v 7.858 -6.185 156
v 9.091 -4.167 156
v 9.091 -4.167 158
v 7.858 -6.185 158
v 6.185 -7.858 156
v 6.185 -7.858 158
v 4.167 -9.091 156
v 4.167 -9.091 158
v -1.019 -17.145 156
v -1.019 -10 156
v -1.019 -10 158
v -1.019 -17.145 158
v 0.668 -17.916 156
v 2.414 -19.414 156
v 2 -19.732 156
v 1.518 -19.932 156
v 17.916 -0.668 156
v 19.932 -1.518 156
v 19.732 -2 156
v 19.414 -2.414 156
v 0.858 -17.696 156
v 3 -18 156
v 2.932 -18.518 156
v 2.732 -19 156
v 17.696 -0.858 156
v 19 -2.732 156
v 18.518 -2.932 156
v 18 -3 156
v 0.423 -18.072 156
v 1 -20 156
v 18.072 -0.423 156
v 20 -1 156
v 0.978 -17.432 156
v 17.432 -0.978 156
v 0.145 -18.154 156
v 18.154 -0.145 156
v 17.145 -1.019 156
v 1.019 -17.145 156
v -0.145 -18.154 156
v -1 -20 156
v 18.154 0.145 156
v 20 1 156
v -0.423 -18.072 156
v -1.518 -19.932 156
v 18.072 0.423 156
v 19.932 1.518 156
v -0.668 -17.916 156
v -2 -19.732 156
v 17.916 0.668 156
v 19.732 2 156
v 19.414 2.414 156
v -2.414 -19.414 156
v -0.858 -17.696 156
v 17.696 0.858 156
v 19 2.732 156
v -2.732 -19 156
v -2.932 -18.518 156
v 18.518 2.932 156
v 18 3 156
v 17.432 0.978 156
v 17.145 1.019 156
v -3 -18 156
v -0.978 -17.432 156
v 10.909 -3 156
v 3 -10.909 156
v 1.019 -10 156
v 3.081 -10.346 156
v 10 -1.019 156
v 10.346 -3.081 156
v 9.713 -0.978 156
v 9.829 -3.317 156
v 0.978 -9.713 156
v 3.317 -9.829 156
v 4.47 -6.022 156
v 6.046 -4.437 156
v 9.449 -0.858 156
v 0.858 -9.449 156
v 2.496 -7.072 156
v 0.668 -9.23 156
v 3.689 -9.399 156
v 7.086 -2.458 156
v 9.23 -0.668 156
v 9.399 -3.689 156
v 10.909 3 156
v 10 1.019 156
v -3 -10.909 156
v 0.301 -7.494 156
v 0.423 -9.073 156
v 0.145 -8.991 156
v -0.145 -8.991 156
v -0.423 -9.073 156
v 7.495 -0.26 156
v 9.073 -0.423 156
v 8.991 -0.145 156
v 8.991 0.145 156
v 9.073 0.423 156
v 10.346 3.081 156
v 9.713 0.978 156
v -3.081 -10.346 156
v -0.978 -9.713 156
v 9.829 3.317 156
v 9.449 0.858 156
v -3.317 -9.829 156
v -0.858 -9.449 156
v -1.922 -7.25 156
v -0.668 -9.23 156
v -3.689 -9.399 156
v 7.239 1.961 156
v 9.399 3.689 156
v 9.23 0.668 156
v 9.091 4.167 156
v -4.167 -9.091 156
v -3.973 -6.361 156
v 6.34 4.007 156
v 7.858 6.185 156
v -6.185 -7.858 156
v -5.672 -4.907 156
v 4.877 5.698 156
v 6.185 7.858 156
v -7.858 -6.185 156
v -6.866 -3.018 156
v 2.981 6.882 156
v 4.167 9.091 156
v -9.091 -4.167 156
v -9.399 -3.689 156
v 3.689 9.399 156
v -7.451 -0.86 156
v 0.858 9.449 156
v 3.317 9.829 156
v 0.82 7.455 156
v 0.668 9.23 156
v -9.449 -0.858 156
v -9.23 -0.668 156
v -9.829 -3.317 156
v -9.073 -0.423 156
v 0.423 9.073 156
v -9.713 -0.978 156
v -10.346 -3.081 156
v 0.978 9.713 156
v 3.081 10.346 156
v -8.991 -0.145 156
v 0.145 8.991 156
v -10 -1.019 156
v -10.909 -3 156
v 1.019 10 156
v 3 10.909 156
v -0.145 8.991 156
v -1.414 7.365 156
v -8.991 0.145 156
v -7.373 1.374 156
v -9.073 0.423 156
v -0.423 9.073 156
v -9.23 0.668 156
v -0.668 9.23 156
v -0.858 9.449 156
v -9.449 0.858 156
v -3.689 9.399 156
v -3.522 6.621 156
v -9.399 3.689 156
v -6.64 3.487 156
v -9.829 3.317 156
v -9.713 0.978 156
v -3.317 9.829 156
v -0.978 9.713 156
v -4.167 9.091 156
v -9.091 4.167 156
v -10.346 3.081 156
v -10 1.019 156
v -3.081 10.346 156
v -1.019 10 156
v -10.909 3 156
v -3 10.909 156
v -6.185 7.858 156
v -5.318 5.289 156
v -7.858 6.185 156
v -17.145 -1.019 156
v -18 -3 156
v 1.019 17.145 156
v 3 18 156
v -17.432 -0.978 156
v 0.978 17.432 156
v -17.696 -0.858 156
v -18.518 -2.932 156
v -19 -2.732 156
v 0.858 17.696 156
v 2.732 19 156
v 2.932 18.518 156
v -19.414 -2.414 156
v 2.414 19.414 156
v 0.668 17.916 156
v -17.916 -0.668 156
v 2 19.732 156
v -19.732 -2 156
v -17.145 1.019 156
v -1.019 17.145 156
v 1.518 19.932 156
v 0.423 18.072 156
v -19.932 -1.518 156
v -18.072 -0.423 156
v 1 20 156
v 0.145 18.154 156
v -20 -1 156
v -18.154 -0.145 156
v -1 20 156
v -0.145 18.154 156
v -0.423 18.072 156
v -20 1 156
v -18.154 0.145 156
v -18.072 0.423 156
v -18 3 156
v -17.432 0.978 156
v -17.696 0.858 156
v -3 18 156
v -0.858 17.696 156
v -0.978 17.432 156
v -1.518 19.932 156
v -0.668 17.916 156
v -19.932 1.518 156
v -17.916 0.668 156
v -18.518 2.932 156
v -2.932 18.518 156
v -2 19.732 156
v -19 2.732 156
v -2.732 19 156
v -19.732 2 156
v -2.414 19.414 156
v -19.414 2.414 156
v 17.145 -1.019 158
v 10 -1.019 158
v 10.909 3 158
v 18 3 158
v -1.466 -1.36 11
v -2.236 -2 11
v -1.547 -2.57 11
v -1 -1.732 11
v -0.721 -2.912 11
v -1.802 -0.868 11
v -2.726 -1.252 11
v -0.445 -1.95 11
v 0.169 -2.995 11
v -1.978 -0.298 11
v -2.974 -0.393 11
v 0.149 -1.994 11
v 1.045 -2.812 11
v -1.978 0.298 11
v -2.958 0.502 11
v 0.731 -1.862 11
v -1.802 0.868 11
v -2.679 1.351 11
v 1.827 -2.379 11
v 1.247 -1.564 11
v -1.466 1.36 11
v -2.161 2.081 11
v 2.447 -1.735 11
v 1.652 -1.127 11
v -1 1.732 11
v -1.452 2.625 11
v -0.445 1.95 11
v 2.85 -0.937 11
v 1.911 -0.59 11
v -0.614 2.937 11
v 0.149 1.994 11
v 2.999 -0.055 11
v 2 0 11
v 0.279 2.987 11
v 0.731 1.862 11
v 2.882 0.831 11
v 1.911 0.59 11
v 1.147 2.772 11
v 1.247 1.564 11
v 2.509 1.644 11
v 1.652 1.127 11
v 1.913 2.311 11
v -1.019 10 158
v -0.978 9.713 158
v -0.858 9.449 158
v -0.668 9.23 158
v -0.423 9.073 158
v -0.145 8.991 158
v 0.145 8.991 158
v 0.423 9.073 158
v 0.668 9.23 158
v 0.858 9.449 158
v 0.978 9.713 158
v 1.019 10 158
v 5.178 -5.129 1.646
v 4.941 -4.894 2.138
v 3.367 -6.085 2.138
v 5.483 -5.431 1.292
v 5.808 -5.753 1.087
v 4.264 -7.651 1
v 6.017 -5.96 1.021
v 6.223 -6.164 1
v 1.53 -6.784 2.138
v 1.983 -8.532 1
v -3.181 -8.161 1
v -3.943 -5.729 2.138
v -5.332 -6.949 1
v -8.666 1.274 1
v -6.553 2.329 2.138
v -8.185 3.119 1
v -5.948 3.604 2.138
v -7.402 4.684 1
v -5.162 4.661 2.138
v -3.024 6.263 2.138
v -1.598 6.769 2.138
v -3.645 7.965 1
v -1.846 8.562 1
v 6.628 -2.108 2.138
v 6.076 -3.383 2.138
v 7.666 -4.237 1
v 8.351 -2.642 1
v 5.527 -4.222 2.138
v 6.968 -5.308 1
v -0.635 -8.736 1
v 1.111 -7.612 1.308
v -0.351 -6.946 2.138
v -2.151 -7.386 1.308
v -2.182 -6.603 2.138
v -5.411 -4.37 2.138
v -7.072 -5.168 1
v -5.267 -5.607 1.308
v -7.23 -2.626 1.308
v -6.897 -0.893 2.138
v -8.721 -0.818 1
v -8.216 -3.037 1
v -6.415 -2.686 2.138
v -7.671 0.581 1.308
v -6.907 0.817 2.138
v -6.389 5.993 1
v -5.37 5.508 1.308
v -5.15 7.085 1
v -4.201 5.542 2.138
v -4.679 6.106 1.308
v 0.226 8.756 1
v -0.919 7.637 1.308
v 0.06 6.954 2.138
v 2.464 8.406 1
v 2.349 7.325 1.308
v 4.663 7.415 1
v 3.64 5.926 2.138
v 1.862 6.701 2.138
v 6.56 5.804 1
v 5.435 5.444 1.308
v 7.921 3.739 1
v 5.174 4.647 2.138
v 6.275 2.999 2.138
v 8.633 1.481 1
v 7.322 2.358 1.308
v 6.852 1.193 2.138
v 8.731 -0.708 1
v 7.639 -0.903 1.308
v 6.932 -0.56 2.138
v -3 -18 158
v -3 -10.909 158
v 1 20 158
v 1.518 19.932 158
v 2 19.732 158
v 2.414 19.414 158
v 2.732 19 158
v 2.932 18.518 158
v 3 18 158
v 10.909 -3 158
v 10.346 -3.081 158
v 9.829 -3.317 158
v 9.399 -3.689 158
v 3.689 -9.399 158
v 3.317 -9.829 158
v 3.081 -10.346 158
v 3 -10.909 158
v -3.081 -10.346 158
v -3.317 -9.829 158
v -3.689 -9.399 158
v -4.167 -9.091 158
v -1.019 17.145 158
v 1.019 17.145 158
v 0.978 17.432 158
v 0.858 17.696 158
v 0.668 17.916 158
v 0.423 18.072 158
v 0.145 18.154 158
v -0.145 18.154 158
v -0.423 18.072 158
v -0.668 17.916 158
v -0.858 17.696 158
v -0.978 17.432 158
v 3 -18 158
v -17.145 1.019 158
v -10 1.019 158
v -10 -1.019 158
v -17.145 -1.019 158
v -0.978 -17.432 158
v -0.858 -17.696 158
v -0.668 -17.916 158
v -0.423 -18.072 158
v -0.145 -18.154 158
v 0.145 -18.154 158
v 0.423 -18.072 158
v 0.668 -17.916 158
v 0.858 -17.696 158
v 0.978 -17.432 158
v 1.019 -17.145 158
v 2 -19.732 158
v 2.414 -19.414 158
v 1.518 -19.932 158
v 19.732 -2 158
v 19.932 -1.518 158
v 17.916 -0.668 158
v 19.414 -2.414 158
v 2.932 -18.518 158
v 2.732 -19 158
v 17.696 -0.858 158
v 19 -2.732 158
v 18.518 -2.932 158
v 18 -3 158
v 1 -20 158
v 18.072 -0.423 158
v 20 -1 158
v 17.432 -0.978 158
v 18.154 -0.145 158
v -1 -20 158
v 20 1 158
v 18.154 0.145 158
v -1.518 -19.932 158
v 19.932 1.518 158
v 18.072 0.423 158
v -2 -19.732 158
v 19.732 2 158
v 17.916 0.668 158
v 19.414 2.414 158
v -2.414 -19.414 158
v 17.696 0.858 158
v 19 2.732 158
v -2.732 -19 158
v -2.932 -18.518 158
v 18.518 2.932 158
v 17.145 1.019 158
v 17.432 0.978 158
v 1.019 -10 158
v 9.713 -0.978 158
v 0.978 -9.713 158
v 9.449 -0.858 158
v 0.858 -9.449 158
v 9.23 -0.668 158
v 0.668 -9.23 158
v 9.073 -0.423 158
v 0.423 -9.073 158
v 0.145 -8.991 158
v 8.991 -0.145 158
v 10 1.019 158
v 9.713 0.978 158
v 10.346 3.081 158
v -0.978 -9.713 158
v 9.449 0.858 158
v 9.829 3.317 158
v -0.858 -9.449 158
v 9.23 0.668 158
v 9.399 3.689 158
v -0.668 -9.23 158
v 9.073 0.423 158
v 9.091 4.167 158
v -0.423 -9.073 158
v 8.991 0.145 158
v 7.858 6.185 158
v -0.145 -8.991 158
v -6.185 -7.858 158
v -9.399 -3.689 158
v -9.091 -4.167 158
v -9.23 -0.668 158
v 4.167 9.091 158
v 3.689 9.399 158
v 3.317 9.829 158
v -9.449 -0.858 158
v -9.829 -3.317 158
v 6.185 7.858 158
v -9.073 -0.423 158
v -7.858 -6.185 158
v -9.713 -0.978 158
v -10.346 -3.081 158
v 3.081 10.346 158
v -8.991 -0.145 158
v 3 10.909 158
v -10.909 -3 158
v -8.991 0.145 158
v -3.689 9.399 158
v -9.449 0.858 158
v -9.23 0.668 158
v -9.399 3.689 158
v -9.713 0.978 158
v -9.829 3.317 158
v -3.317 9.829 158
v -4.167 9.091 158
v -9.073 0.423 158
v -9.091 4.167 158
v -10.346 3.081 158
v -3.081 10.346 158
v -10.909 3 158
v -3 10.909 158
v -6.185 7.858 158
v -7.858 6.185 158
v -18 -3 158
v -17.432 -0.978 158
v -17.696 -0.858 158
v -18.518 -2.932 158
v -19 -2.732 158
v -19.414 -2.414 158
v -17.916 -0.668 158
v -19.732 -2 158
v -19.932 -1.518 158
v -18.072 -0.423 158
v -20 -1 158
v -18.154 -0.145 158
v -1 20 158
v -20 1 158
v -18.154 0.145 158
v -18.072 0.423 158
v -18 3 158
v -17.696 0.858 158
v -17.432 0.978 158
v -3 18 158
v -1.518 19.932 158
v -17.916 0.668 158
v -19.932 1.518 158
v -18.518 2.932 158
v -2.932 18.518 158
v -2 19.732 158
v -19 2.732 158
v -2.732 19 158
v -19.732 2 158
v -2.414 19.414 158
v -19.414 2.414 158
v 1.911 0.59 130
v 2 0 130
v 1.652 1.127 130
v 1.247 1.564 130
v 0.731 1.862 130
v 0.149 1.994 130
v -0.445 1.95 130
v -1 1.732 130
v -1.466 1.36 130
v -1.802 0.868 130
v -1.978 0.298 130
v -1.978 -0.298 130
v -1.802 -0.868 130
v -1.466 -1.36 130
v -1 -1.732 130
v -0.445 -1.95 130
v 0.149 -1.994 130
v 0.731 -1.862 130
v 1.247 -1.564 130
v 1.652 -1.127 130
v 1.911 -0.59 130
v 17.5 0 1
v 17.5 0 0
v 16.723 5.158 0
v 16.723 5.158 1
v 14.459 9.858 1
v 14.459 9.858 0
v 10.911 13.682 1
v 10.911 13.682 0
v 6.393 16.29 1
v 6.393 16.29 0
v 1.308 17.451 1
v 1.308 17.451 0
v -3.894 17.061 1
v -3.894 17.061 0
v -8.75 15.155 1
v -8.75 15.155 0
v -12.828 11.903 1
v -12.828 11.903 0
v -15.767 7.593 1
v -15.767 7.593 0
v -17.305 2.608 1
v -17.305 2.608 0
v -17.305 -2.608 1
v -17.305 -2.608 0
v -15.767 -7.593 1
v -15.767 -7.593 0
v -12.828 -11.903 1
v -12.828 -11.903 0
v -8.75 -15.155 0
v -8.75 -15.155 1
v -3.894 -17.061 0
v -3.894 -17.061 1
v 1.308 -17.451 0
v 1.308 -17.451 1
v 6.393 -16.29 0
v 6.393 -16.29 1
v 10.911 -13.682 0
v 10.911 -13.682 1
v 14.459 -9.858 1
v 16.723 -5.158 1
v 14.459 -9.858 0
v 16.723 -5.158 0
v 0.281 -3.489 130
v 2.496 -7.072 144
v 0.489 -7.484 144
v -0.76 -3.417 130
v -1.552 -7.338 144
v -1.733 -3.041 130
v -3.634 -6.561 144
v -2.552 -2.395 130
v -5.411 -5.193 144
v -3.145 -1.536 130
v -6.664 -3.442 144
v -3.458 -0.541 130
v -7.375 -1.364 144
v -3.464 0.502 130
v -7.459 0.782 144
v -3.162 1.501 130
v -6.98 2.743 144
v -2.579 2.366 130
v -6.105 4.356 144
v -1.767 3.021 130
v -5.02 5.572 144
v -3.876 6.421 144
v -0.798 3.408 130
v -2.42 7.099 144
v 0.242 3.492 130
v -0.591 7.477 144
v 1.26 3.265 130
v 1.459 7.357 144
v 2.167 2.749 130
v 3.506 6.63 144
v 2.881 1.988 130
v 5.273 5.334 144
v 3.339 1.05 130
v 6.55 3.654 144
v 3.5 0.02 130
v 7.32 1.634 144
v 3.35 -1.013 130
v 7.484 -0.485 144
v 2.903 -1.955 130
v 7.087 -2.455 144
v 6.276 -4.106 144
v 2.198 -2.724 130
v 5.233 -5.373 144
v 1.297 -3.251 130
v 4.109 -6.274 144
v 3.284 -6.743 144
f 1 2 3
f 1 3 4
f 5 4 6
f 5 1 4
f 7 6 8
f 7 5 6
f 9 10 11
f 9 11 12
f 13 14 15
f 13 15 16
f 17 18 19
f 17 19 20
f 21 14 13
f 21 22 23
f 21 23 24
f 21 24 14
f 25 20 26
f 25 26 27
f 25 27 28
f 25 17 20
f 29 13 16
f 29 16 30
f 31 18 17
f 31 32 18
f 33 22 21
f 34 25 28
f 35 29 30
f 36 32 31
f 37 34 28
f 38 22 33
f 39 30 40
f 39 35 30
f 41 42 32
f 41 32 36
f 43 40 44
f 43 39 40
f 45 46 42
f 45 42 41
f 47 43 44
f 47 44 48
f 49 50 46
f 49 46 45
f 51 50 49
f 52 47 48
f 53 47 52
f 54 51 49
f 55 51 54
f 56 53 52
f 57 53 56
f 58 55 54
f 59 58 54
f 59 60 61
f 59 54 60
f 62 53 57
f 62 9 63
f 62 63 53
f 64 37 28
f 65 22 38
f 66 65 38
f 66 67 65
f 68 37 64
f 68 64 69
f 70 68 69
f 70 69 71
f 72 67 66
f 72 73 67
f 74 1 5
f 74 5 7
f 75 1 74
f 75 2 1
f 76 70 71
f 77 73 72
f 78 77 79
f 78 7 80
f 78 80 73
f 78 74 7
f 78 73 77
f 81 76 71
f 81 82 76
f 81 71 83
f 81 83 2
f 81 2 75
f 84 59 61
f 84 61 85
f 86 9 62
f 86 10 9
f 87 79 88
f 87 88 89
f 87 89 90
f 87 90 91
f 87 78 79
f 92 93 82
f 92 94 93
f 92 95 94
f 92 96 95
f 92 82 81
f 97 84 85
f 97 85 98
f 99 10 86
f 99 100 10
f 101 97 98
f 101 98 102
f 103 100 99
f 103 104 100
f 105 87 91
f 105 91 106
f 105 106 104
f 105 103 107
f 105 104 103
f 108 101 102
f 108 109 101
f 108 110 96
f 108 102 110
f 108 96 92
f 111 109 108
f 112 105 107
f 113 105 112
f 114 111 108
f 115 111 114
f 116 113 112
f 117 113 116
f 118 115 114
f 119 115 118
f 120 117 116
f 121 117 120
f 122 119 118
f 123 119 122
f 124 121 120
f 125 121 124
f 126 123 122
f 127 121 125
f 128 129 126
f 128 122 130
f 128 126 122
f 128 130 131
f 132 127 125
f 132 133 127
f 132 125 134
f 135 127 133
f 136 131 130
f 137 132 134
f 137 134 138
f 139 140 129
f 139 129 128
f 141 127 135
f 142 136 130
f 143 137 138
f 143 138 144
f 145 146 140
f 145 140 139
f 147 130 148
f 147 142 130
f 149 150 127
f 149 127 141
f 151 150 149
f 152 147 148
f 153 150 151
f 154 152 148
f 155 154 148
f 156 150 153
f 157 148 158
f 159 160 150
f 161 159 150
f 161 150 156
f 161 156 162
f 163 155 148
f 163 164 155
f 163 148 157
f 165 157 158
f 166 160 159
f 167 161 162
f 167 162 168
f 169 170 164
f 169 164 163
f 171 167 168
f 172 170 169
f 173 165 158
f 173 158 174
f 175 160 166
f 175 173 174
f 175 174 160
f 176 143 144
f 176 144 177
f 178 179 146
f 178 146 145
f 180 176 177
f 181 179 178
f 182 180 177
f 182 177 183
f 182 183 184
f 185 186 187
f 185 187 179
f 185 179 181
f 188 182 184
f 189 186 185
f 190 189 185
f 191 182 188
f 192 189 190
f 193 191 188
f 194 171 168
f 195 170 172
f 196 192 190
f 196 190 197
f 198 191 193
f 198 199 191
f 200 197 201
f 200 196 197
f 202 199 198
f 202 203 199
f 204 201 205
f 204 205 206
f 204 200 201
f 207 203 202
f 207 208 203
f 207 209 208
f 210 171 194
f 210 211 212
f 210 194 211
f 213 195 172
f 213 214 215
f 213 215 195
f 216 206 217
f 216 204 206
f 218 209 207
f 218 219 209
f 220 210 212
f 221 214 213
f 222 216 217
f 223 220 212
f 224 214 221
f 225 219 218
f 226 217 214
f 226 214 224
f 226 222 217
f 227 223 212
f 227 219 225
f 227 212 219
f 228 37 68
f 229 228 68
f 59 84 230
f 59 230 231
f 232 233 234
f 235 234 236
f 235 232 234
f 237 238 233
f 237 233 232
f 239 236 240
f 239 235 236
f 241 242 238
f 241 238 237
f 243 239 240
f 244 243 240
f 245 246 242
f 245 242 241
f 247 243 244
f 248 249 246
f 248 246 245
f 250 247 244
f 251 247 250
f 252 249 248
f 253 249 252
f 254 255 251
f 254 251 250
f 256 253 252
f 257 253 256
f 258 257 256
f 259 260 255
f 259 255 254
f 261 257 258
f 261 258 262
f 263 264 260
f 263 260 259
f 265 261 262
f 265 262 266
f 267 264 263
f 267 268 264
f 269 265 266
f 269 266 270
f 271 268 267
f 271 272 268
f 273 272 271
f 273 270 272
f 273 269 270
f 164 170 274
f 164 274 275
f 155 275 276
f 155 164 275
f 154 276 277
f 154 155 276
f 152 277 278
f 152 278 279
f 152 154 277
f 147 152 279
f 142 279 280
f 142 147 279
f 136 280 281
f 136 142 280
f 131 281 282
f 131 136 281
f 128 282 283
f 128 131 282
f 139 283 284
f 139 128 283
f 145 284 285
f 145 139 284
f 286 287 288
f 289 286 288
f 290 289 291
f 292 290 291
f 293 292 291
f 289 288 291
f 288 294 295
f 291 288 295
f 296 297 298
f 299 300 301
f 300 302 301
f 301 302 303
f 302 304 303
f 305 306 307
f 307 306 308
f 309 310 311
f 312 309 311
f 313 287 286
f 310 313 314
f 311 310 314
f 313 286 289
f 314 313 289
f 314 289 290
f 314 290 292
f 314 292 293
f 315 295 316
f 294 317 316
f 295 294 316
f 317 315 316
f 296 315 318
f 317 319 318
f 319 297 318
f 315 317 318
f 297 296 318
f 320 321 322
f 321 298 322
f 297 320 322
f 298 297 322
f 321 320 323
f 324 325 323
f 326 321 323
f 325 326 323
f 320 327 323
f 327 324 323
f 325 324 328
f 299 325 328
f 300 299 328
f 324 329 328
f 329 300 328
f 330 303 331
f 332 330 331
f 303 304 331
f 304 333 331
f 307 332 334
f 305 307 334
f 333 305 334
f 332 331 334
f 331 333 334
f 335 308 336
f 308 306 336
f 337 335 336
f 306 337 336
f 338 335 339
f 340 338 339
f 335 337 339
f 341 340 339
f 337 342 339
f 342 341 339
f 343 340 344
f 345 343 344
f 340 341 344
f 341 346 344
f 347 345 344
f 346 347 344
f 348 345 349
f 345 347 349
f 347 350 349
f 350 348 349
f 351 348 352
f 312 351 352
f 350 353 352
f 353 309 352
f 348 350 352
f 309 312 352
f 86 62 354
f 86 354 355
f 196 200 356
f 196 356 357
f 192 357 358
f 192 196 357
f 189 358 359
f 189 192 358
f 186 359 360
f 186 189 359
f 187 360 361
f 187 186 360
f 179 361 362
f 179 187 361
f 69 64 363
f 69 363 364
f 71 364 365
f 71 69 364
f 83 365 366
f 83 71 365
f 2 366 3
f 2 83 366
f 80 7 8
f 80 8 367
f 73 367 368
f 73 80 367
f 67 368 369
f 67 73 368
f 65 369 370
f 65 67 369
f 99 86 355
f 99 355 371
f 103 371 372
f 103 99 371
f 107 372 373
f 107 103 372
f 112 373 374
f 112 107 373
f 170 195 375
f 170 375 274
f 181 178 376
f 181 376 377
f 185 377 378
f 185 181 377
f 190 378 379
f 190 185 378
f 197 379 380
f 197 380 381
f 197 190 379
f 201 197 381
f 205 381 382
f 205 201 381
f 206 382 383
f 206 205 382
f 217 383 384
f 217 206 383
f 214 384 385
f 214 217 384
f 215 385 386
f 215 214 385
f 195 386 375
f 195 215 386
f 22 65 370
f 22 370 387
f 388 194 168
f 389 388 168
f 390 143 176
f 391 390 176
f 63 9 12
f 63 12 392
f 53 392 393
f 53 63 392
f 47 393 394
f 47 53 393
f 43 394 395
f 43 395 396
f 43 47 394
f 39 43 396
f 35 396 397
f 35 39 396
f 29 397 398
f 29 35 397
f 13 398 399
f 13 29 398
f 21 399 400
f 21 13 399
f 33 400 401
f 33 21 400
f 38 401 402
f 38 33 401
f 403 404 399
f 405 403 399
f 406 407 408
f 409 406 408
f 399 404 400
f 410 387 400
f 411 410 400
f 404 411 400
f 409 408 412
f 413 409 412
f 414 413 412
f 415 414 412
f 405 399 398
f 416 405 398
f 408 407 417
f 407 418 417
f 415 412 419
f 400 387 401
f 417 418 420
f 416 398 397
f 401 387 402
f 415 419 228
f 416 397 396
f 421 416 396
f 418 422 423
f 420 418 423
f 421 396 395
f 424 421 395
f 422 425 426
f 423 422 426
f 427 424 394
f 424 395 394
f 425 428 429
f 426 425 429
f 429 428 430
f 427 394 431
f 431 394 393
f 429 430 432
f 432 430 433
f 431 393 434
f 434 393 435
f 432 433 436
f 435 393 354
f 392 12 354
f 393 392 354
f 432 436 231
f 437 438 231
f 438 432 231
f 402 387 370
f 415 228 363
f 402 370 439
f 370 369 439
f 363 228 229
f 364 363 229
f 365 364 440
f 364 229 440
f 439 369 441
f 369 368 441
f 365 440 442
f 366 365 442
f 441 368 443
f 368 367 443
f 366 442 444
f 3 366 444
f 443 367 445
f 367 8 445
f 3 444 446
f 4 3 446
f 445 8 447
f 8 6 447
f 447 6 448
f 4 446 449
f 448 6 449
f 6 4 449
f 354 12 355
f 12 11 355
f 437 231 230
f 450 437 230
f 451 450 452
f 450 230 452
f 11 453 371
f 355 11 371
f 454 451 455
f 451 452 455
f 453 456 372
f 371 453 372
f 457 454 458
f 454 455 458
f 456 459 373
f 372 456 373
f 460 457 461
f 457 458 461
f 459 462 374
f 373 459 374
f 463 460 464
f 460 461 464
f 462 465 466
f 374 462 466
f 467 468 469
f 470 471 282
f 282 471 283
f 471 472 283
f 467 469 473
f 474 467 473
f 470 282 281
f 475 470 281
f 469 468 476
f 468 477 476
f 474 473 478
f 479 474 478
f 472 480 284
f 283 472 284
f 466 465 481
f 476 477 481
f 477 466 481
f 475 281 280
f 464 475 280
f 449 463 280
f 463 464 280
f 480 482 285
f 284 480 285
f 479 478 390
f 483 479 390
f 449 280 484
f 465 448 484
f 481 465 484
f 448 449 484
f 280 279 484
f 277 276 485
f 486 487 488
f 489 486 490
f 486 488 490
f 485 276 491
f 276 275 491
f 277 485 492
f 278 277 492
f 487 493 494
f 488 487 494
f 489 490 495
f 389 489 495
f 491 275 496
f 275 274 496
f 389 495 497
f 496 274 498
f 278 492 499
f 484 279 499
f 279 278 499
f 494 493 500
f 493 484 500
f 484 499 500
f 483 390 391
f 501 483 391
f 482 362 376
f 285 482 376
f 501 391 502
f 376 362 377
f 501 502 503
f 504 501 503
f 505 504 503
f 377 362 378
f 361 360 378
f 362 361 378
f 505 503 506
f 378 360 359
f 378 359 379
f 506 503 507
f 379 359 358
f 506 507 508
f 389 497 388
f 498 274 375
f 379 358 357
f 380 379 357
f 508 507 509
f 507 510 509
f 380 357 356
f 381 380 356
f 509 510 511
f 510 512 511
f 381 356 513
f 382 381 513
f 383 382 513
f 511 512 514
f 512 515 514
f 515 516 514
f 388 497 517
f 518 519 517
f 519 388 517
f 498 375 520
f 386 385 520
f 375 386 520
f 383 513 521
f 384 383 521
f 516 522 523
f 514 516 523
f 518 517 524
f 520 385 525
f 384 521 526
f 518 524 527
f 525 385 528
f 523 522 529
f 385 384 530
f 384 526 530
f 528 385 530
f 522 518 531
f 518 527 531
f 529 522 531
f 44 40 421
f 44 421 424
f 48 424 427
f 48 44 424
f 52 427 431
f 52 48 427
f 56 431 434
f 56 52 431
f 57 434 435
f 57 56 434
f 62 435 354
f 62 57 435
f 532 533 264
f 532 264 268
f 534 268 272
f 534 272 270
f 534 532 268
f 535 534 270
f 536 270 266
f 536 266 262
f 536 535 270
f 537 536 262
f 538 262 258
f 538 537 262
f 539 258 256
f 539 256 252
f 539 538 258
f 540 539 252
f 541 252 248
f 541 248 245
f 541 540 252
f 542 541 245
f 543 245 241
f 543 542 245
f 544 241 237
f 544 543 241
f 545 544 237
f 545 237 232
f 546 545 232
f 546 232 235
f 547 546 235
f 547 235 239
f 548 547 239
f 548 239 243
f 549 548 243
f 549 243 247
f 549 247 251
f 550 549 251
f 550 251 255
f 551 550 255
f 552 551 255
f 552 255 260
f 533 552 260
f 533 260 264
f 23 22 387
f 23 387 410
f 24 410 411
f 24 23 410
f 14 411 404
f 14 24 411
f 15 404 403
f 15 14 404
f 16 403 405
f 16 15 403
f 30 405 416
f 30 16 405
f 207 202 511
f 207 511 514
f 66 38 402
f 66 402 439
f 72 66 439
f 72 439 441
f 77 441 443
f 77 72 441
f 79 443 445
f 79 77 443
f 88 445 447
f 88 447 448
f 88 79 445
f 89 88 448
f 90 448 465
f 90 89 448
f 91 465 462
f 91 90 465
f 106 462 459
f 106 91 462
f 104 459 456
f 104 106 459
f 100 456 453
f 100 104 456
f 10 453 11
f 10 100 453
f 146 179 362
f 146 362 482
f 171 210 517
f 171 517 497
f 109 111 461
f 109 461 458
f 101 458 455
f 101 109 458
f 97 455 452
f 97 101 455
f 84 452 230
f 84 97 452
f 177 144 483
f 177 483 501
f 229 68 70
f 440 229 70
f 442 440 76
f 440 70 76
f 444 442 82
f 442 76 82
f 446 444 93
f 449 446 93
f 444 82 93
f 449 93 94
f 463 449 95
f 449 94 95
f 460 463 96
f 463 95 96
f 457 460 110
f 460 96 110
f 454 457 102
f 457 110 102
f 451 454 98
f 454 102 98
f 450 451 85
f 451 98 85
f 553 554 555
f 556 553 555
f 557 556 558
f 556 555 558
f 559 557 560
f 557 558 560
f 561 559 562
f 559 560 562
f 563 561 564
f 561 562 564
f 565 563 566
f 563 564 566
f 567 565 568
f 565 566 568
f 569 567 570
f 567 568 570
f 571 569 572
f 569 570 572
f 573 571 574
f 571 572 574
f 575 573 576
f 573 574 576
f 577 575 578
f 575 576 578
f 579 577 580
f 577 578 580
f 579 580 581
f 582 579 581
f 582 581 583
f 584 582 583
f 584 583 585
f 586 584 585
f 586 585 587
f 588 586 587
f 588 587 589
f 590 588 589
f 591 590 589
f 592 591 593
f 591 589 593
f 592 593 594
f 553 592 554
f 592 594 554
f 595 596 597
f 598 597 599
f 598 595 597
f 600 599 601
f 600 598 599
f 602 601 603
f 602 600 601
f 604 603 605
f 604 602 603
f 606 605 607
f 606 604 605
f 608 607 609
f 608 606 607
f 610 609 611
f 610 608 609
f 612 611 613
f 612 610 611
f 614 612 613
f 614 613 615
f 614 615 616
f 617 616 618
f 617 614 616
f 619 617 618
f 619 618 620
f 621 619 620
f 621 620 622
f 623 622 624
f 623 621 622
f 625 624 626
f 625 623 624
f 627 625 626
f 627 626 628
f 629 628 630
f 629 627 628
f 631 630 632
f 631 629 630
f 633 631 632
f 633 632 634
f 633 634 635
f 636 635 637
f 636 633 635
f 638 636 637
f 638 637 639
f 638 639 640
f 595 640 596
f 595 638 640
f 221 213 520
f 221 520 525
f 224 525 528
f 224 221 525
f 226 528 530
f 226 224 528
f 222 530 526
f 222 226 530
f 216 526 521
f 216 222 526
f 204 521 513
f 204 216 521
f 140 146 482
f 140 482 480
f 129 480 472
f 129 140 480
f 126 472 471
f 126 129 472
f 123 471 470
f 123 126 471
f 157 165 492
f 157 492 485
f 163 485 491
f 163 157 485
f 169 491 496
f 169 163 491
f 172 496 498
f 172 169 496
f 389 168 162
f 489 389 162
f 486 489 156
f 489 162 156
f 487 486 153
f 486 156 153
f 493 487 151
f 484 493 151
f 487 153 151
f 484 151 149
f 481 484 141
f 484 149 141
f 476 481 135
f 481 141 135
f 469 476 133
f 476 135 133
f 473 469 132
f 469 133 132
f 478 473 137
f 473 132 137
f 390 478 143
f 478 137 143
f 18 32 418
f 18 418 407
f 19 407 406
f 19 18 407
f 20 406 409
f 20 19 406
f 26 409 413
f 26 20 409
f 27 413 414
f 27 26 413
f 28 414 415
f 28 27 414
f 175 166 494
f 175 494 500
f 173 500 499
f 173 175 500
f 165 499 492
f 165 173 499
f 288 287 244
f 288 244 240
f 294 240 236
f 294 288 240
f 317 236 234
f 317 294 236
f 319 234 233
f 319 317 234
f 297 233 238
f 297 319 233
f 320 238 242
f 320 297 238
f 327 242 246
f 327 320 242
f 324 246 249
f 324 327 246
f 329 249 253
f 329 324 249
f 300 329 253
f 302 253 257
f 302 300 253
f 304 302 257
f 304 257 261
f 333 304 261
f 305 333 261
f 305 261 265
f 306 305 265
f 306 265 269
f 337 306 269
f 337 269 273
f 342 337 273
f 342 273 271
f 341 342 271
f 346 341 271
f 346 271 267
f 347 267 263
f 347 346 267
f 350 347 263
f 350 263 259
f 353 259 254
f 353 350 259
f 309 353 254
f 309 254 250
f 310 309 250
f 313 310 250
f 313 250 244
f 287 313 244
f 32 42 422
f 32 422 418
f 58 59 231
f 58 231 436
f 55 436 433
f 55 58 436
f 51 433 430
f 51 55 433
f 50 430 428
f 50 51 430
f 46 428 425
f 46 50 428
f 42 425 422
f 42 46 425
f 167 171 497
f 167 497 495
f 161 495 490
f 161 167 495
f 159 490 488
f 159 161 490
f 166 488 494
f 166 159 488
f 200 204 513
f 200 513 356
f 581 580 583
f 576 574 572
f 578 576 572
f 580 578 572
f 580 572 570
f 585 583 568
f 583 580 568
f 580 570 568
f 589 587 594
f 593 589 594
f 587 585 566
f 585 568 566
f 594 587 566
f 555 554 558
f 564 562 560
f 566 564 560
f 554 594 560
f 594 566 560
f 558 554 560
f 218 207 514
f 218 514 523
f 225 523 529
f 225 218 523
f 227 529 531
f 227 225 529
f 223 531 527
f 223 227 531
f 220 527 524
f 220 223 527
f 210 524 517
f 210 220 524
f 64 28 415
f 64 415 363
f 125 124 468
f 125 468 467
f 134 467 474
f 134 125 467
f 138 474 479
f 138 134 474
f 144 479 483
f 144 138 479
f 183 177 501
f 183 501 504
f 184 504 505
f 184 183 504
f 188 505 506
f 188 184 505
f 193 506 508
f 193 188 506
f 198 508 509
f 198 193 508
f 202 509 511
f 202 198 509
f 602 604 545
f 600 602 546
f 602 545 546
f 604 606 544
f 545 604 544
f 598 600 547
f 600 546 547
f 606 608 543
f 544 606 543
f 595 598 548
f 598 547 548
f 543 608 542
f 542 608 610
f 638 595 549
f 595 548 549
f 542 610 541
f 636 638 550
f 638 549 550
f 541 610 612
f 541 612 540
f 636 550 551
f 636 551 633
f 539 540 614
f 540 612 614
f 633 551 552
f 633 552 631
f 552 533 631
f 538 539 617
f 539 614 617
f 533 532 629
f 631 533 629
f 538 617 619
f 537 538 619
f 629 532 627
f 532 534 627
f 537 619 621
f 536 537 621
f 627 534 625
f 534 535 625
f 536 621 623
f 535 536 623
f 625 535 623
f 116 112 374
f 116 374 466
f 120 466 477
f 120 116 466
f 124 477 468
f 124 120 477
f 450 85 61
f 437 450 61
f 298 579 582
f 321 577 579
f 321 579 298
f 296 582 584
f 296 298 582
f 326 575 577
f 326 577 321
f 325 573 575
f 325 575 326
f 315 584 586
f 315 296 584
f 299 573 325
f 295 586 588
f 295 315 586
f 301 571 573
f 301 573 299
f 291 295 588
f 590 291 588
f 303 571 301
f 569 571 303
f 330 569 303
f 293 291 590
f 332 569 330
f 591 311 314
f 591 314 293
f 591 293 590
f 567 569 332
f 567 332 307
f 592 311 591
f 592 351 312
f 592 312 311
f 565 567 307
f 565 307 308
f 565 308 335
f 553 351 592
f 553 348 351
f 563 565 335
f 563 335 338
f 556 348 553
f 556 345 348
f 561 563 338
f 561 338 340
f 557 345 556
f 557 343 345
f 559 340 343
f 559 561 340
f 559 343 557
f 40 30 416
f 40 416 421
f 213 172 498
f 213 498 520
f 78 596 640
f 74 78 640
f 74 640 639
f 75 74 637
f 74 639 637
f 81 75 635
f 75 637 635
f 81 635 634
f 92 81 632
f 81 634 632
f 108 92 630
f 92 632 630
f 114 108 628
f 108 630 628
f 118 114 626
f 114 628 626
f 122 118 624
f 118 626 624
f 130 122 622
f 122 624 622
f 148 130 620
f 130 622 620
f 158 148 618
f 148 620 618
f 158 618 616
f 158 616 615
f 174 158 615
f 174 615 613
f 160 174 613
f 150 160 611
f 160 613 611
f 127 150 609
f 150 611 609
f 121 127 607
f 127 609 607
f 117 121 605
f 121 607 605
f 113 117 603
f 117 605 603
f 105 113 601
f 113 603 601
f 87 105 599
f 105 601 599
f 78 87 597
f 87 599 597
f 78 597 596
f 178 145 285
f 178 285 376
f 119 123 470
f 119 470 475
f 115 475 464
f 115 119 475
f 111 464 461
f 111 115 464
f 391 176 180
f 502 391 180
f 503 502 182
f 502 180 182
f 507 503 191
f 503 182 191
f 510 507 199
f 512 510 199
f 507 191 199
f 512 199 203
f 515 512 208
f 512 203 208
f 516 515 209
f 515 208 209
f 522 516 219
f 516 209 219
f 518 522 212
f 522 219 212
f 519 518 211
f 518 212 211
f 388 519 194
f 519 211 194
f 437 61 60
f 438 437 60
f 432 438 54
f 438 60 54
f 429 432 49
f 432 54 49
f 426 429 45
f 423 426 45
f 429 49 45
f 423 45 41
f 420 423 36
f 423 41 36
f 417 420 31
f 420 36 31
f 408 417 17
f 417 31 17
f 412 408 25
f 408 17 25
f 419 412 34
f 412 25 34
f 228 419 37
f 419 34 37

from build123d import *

# Parameters (mm, degrees)
SKETCH1_R           = 17.5
BOSS_EXTRUDE1_DEPTH = 1
SKETCH3_R           = 3
BOSS_EXTRUDE2_DEPTH = 10
FILLET1_R           = 2
SKETCH4_R           = 2
CUT_EXTRUDE1_DEPTH  = 7
BOSS_EXTRUDE3_START = 140
SKETCH5_R           = 2
BOSS_EXTRUDE3_DEPTH = 140
SKETCH6_R           = 3.5
BOSS_EXTRUDE4_DEPTH = 14
SKETCH8_R           = 7.5
BOSS_EXTRUDE5_DEPTH = 12
BOSS_EXTRUDE6_DEPTH = 2


with BuildPart() as part:
    # Sketch1 → Boss-Extrude1 (new body)
    with BuildSketch(Plane.XY):
        Circle(SKETCH1_R)
    extrude(amount=BOSS_EXTRUDE1_DEPTH)

    # Sketch3 → Boss-Extrude2 (add)
    with BuildSketch(Plane.XY.offset(1)):
        Circle(SKETCH3_R)
    extrude(amount=BOSS_EXTRUDE2_DEPTH)

    # Loft1: read off the stored shape, not the designer's step
    # Loft1: loft between two sections, ruled curve by curve
    loft1_from = [
        Edge.make_bspline([(1.044538227, -2.81228375, 11), (-4.580029274, -4.901360204, 11), (-6.669105728, 0.723207296, 11), (-1.044538227, 2.81228375, 11), (4.580029274, 4.901360204, 11), (6.669105728, -0.723207296, 11), (1.044538227, -2.81228375, 11)], [0, 0, 0, 0, 0.5, 0.5, 0.5, 1, 1, 1, 1], 3, [1, 0.333333333, 0.333333333, 1, 0.333333333, 0.333333333, 1]),
    ]
    loft1_to = [
        Edge.make_bspline([(5.441388928, -5.161519789, 1), (-4.88165065, -16.044297645, 1), (-15.764428506, -5.721258067, 1), (-5.441388928, 5.161519789, 1), (4.88165065, 16.044297645, 1), (15.764428506, 5.721258067, 1), (5.441388928, -5.161519789, 1)], [0, 0, 0, 0, 0.5, 0.5, 0.5, 1, 1, 1, 1], 3, [1, 0.333333333, 0.333333333, 1, 0.333333333, 0.333333333, 1]),
    ]
    loft1 = Solid(Shell([*[Face.make_surface_from_curves(loft1_from[k], loft1_to[k]) for k in range(1)], Face(Wire(loft1_from)), Face(Wire(loft1_to))]))
    add(loft1)

    # Fillet1
    fillet1_edges = [part.edges().sort_by_distance(p)[0] for p in [
        (-5.441388928, 5.161519789, 1),
    ]]
    fillet(fillet1_edges, radius=FILLET1_R)

    # Sketch4 → Cut-Extrude1 (cut)
    with BuildSketch(Plane.XY.offset(11)):
        Circle(SKETCH4_R)
    extrude(amount=-CUT_EXTRUDE1_DEPTH, mode=Mode.SUBTRACT)

    # Sketch5 → Boss-Extrude3 (add)
    with BuildSketch(Plane.XY.offset(4).offset(BOSS_EXTRUDE3_START)):
        Circle(SKETCH5_R)
    extrude(amount=-BOSS_EXTRUDE3_DEPTH)

    # Sketch6 → Boss-Extrude4 (add)
    with BuildSketch(Plane.XY.offset(144)):
        Circle(SKETCH6_R)
    extrude(amount=-BOSS_EXTRUDE4_DEPTH)

    # Loft2: read off the stored shape, not the designer's step
    # Loft2: loft between two sections, ruled curve by curve
    loft2_from = [
        Edge.make_bspline([(2.496146584, -7.072429019, 144), (-11.648711454, -12.064722187, 144), (-16.641004622, 2.080135851, 144), (-2.496146584, 7.072429019, 144), (11.648711454, 12.064722187, 144), (16.641004622, -2.080135851, 144), (2.496146584, -7.072429019, 144)], [0, 0, 0, 0, 0.5, 0.5, 0.5, 1, 1, 1, 1], 3, [1, 0.333333333, 0.333333333, 1, 0.333333333, 0.333333333, 1]),
    ]
    loft2_to = [
        Edge.make_bspline([(0.28118335, -3.488686848, 130), (-6.696190346, -4.051053549, 130), (-7.258557046, 2.926320147, 130), (-0.28118335, 3.488686848, 130), (6.696190346, 4.051053549, 130), (7.258557046, -2.926320147, 130), (0.28118335, -3.488686848, 130)], [0, 0, 0, 0, 0.5, 0.5, 0.5, 1, 1, 1, 1], 3, [1, 0.333333333, 0.333333333, 1, 0.333333333, 0.333333333, 1]),
    ]
    loft2 = Solid(Shell([*[Face.make_surface_from_curves(loft2_from[k], loft2_to[k]) for k in range(1)], Face(Wire(loft2_from)), Face(Wire(loft2_to))]))
    add(loft2)

    # Sketch8 → Boss-Extrude5 (add)
    with BuildSketch(Plane.XY.offset(144)):
        with Locations(Location((0, 0, 0), (0, 0, 289.44))):
            Circle(SKETCH8_R)
    extrude(amount=BOSS_EXTRUDE5_DEPTH)

    # Sketch9 → Boss-Extrude6 (add)
    with BuildSketch(Plane.XY.offset(156)):
        with BuildLine():
            Line((-18, 3), (-10.908712115, 3))
            ThreePointArc((-10.908712115, 3), (-9.828588665, 3.316749177), (-9.090593429, 4.166666667))
            ThreePointArc((-9.090593429, 4.166666667), (-7.071067812, 7.071067812), (-4.166666667, 9.090593429))
            ThreePointArc((-4.166666667, 9.090593429), (-3.316749177, 9.828588665), (-3, 10.908712115))
            Line((-3, 10.908712115), (-3, 18))
            ThreePointArc((-3, 18), (-2.414213562, 19.414213562), (-1, 20))
            Line((-1, 20), (1, 20))
            ThreePointArc((1, 20), (2.414213562, 19.414213562), (3, 18))
            Line((3, 18), (3, 10.908712115))
            ThreePointArc((3, 10.908712115), (3.316749177, 9.828588665), (4.166666667, 9.090593429))
            ThreePointArc((4.166666667, 9.090593429), (7.071067812, 7.071067812), (9.090593429, 4.166666667))
            ThreePointArc((9.090593429, 4.166666667), (9.828588665, 3.316749177), (10.908712115, 3))
            Line((10.908712115, 3), (18, 3))
            ThreePointArc((18, 3), (19.414213562, 2.414213562), (20, 1))
            Line((20, 1), (20, -1))
            ThreePointArc((20, -1), (19.414213562, -2.414213562), (18, -3))
            Line((18, -3), (10.908712115, -3))
            ThreePointArc((10.908712115, -3), (9.828588665, -3.316749177), (9.090593429, -4.166666667))
            ThreePointArc((9.090593429, -4.166666667), (7.071067812, -7.071067812), (4.166666667, -9.090593429))
            ThreePointArc((4.166666667, -9.090593429), (3.316749177, -9.828588665), (3, -10.908712115))
            Line((3, -10.908712115), (3, -18))
            ThreePointArc((3, -18), (2.414213562, -19.414213562), (1, -20))
            Line((1, -20), (-1, -20))
            ThreePointArc((-1, -20), (-2.414213562, -19.414213562), (-3, -18))
            Line((-3, -18), (-3, -10.908712115))
            ThreePointArc((-3, -10.908712115), (-3.316749177, -9.828588665), (-4.166666667, -9.090593429))
            ThreePointArc((-4.166666667, -9.090593429), (-7.071067812, -7.071067812), (-9.090593429, -4.166666667))
            ThreePointArc((-9.090593429, -4.166666667), (-9.828588665, -3.316749177), (-10.908712115, -3))
            Line((-10.908712115, -3), (-18, -3))
            ThreePointArc((-18, -3), (-19.414213562, -2.414213562), (-20, -1))
            Line((-20, -1), (-20, 1))
            ThreePointArc((-20, 1), (-19.414213562, 2.414213562), (-18, 3))
        make_face()
        with BuildLine():
            Line((-17.145168387, 1.019387686), (-10, 1.019387686))
            ThreePointArc((-10, 1.019387686), (-8.980612314, 0), (-10, -1.019387686))
            Line((-10, -1.019387686), (-17.145168387, -1.019387686))
            ThreePointArc((-17.145168387, -1.019387686), (-18.164556073, 0), (-17.145168387, 1.019387686))
        make_face(mode=Mode.SUBTRACT)
        with BuildLine():
            Line((-1.019387686, 17.145168387), (-1.019387686, 10))
            ThreePointArc((-1.019387686, 10), (0, 8.980612314), (1.019387686, 10))
            Line((1.019387686, 10), (1.019387686, 17.145168387))
            ThreePointArc((1.019387686, 17.145168387), (0, 18.164556073), (-1.019387686, 17.145168387))
        make_face(mode=Mode.SUBTRACT)
        with BuildLine():
            Line((1.019387686, -17.145168387), (1.019387686, -10))
            ThreePointArc((1.019387686, -10), (0, -8.980612314), (-1.019387686, -10))
            Line((-1.019387686, -10), (-1.019387686, -17.145168387))
            ThreePointArc((-1.019387686, -17.145168387), (0, -18.164556073), (1.019387686, -17.145168387))
        make_face(mode=Mode.SUBTRACT)
        with BuildLine():
            Line((17.145168387, -1.019387686), (10, -1.019387686))
            ThreePointArc((10, -1.019387686), (8.980612314, 0), (10, 1.019387686))
            Line((10, 1.019387686), (17.145168387, 1.019387686))
            ThreePointArc((17.145168387, 1.019387686), (18.164556073, 0), (17.145168387, -1.019387686))
        make_face(mode=Mode.SUBTRACT)
    extrude(amount=BOSS_EXTRUDE6_DEPTH)


solid = part.part
